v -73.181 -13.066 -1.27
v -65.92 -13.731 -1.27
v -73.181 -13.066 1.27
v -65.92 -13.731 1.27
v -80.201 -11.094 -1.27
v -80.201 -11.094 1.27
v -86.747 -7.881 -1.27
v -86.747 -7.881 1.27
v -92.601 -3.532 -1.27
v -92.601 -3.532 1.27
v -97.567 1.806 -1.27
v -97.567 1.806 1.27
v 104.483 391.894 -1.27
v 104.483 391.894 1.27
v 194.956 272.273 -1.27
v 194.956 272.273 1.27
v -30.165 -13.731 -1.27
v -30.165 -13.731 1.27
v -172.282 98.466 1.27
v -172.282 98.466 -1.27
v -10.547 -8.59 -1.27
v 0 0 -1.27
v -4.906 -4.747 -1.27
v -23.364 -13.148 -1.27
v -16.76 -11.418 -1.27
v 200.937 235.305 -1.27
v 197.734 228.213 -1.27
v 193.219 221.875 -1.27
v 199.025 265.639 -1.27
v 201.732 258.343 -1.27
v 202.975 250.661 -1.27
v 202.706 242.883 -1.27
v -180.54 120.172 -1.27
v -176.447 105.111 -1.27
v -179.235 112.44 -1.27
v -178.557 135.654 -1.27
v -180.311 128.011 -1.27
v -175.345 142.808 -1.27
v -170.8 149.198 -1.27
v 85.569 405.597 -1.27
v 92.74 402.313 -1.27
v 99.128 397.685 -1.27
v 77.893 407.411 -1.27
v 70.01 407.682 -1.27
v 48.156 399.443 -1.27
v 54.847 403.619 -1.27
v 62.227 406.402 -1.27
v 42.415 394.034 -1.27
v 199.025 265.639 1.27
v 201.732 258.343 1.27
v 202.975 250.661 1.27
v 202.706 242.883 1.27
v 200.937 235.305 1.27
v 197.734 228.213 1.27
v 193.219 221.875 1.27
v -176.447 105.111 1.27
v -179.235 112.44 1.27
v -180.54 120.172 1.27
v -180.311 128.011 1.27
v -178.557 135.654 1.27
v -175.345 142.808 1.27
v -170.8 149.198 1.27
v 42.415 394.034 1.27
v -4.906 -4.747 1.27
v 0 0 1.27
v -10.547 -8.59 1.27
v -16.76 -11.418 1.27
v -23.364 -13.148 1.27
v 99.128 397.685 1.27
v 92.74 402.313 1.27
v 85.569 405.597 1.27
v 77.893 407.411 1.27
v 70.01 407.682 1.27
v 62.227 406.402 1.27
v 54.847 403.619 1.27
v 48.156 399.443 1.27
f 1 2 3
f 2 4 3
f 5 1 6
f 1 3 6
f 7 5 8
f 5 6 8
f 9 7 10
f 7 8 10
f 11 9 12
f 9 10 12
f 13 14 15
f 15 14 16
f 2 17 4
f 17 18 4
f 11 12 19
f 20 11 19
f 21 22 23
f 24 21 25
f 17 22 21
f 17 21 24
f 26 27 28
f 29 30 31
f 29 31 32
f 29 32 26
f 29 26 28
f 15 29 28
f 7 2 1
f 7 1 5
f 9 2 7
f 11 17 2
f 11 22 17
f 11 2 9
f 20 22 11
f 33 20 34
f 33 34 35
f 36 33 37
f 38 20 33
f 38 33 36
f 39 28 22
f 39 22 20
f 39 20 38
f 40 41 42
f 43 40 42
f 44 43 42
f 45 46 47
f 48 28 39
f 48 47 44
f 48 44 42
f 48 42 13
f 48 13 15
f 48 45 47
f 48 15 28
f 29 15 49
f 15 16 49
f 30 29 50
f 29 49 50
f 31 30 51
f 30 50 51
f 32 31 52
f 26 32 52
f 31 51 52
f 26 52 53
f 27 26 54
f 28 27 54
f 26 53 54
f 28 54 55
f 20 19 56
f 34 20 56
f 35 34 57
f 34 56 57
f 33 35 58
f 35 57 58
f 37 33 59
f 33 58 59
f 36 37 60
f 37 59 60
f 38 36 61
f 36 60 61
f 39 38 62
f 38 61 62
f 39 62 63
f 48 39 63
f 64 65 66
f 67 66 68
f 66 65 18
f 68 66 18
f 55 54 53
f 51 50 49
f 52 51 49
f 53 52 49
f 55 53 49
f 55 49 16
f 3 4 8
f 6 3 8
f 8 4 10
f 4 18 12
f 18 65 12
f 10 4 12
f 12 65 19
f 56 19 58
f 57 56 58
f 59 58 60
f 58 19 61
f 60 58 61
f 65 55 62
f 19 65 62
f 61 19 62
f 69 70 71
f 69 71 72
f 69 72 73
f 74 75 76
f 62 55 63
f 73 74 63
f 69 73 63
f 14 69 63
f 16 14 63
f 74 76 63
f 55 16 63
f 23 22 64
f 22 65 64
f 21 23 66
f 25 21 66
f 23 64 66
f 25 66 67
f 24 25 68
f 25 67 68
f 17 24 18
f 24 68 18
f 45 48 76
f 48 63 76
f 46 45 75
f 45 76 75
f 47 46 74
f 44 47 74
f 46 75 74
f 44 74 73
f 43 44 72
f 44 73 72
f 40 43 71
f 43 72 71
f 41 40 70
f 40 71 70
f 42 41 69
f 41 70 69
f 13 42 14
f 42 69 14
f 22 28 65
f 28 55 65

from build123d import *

# Parameters (mm, degrees)
BOSS_EXTRUDE1_DEPTH = 1.5875
SCALE1_SCALE        = 0.8


with BuildPart() as part:
    # Sketch1 → Boss-Extrude1 (new body, symmetric)
    with BuildSketch(Plane.XY):
        with BuildLine():
            Line((-213.499711216, 186.497468723), (53.01875396, 492.542625266))
            ThreePointArc((53.01875396, 492.542625266), (92.447986648, 509.676487347), (130.603493871, 489.867628503))
            Line((130.603493871, 489.867628503), (243.695621782, 340.341208487))
            ThreePointArc((243.695621782, 340.341208487), (253.7875264, 308.456864193), (241.52355595, 277.343314433))
            Line((241.52355595, 277.343314433), (0, 0))
            ThreePointArc((0, 0), (-16.991876757, -12.670819234), (-37.70633704, -17.163554592))
            Line((-37.70633704, -17.163554592), (-82.399555371, -17.163554592))
            ThreePointArc((-82.399555371, -17.163554592), (-104.434529771, -12.046289615), (-121.959152061, 2.25804928))
            Line((-121.959152061, 2.25804928), (-215.352970866, 123.082627187))
            ThreePointArc((-215.352970866, 123.082627187), (-225.772036229, 155.121618903), (-213.499711216, 186.497468723))
        make_face()
    extrude(amount=BOSS_EXTRUDE1_DEPTH, both=True)


with BuildPart() as part_1:
    # Scale1: scaled about (0, 0, 0)
    add(part.part.scale(SCALE1_SCALE))


solid = part_1.part
